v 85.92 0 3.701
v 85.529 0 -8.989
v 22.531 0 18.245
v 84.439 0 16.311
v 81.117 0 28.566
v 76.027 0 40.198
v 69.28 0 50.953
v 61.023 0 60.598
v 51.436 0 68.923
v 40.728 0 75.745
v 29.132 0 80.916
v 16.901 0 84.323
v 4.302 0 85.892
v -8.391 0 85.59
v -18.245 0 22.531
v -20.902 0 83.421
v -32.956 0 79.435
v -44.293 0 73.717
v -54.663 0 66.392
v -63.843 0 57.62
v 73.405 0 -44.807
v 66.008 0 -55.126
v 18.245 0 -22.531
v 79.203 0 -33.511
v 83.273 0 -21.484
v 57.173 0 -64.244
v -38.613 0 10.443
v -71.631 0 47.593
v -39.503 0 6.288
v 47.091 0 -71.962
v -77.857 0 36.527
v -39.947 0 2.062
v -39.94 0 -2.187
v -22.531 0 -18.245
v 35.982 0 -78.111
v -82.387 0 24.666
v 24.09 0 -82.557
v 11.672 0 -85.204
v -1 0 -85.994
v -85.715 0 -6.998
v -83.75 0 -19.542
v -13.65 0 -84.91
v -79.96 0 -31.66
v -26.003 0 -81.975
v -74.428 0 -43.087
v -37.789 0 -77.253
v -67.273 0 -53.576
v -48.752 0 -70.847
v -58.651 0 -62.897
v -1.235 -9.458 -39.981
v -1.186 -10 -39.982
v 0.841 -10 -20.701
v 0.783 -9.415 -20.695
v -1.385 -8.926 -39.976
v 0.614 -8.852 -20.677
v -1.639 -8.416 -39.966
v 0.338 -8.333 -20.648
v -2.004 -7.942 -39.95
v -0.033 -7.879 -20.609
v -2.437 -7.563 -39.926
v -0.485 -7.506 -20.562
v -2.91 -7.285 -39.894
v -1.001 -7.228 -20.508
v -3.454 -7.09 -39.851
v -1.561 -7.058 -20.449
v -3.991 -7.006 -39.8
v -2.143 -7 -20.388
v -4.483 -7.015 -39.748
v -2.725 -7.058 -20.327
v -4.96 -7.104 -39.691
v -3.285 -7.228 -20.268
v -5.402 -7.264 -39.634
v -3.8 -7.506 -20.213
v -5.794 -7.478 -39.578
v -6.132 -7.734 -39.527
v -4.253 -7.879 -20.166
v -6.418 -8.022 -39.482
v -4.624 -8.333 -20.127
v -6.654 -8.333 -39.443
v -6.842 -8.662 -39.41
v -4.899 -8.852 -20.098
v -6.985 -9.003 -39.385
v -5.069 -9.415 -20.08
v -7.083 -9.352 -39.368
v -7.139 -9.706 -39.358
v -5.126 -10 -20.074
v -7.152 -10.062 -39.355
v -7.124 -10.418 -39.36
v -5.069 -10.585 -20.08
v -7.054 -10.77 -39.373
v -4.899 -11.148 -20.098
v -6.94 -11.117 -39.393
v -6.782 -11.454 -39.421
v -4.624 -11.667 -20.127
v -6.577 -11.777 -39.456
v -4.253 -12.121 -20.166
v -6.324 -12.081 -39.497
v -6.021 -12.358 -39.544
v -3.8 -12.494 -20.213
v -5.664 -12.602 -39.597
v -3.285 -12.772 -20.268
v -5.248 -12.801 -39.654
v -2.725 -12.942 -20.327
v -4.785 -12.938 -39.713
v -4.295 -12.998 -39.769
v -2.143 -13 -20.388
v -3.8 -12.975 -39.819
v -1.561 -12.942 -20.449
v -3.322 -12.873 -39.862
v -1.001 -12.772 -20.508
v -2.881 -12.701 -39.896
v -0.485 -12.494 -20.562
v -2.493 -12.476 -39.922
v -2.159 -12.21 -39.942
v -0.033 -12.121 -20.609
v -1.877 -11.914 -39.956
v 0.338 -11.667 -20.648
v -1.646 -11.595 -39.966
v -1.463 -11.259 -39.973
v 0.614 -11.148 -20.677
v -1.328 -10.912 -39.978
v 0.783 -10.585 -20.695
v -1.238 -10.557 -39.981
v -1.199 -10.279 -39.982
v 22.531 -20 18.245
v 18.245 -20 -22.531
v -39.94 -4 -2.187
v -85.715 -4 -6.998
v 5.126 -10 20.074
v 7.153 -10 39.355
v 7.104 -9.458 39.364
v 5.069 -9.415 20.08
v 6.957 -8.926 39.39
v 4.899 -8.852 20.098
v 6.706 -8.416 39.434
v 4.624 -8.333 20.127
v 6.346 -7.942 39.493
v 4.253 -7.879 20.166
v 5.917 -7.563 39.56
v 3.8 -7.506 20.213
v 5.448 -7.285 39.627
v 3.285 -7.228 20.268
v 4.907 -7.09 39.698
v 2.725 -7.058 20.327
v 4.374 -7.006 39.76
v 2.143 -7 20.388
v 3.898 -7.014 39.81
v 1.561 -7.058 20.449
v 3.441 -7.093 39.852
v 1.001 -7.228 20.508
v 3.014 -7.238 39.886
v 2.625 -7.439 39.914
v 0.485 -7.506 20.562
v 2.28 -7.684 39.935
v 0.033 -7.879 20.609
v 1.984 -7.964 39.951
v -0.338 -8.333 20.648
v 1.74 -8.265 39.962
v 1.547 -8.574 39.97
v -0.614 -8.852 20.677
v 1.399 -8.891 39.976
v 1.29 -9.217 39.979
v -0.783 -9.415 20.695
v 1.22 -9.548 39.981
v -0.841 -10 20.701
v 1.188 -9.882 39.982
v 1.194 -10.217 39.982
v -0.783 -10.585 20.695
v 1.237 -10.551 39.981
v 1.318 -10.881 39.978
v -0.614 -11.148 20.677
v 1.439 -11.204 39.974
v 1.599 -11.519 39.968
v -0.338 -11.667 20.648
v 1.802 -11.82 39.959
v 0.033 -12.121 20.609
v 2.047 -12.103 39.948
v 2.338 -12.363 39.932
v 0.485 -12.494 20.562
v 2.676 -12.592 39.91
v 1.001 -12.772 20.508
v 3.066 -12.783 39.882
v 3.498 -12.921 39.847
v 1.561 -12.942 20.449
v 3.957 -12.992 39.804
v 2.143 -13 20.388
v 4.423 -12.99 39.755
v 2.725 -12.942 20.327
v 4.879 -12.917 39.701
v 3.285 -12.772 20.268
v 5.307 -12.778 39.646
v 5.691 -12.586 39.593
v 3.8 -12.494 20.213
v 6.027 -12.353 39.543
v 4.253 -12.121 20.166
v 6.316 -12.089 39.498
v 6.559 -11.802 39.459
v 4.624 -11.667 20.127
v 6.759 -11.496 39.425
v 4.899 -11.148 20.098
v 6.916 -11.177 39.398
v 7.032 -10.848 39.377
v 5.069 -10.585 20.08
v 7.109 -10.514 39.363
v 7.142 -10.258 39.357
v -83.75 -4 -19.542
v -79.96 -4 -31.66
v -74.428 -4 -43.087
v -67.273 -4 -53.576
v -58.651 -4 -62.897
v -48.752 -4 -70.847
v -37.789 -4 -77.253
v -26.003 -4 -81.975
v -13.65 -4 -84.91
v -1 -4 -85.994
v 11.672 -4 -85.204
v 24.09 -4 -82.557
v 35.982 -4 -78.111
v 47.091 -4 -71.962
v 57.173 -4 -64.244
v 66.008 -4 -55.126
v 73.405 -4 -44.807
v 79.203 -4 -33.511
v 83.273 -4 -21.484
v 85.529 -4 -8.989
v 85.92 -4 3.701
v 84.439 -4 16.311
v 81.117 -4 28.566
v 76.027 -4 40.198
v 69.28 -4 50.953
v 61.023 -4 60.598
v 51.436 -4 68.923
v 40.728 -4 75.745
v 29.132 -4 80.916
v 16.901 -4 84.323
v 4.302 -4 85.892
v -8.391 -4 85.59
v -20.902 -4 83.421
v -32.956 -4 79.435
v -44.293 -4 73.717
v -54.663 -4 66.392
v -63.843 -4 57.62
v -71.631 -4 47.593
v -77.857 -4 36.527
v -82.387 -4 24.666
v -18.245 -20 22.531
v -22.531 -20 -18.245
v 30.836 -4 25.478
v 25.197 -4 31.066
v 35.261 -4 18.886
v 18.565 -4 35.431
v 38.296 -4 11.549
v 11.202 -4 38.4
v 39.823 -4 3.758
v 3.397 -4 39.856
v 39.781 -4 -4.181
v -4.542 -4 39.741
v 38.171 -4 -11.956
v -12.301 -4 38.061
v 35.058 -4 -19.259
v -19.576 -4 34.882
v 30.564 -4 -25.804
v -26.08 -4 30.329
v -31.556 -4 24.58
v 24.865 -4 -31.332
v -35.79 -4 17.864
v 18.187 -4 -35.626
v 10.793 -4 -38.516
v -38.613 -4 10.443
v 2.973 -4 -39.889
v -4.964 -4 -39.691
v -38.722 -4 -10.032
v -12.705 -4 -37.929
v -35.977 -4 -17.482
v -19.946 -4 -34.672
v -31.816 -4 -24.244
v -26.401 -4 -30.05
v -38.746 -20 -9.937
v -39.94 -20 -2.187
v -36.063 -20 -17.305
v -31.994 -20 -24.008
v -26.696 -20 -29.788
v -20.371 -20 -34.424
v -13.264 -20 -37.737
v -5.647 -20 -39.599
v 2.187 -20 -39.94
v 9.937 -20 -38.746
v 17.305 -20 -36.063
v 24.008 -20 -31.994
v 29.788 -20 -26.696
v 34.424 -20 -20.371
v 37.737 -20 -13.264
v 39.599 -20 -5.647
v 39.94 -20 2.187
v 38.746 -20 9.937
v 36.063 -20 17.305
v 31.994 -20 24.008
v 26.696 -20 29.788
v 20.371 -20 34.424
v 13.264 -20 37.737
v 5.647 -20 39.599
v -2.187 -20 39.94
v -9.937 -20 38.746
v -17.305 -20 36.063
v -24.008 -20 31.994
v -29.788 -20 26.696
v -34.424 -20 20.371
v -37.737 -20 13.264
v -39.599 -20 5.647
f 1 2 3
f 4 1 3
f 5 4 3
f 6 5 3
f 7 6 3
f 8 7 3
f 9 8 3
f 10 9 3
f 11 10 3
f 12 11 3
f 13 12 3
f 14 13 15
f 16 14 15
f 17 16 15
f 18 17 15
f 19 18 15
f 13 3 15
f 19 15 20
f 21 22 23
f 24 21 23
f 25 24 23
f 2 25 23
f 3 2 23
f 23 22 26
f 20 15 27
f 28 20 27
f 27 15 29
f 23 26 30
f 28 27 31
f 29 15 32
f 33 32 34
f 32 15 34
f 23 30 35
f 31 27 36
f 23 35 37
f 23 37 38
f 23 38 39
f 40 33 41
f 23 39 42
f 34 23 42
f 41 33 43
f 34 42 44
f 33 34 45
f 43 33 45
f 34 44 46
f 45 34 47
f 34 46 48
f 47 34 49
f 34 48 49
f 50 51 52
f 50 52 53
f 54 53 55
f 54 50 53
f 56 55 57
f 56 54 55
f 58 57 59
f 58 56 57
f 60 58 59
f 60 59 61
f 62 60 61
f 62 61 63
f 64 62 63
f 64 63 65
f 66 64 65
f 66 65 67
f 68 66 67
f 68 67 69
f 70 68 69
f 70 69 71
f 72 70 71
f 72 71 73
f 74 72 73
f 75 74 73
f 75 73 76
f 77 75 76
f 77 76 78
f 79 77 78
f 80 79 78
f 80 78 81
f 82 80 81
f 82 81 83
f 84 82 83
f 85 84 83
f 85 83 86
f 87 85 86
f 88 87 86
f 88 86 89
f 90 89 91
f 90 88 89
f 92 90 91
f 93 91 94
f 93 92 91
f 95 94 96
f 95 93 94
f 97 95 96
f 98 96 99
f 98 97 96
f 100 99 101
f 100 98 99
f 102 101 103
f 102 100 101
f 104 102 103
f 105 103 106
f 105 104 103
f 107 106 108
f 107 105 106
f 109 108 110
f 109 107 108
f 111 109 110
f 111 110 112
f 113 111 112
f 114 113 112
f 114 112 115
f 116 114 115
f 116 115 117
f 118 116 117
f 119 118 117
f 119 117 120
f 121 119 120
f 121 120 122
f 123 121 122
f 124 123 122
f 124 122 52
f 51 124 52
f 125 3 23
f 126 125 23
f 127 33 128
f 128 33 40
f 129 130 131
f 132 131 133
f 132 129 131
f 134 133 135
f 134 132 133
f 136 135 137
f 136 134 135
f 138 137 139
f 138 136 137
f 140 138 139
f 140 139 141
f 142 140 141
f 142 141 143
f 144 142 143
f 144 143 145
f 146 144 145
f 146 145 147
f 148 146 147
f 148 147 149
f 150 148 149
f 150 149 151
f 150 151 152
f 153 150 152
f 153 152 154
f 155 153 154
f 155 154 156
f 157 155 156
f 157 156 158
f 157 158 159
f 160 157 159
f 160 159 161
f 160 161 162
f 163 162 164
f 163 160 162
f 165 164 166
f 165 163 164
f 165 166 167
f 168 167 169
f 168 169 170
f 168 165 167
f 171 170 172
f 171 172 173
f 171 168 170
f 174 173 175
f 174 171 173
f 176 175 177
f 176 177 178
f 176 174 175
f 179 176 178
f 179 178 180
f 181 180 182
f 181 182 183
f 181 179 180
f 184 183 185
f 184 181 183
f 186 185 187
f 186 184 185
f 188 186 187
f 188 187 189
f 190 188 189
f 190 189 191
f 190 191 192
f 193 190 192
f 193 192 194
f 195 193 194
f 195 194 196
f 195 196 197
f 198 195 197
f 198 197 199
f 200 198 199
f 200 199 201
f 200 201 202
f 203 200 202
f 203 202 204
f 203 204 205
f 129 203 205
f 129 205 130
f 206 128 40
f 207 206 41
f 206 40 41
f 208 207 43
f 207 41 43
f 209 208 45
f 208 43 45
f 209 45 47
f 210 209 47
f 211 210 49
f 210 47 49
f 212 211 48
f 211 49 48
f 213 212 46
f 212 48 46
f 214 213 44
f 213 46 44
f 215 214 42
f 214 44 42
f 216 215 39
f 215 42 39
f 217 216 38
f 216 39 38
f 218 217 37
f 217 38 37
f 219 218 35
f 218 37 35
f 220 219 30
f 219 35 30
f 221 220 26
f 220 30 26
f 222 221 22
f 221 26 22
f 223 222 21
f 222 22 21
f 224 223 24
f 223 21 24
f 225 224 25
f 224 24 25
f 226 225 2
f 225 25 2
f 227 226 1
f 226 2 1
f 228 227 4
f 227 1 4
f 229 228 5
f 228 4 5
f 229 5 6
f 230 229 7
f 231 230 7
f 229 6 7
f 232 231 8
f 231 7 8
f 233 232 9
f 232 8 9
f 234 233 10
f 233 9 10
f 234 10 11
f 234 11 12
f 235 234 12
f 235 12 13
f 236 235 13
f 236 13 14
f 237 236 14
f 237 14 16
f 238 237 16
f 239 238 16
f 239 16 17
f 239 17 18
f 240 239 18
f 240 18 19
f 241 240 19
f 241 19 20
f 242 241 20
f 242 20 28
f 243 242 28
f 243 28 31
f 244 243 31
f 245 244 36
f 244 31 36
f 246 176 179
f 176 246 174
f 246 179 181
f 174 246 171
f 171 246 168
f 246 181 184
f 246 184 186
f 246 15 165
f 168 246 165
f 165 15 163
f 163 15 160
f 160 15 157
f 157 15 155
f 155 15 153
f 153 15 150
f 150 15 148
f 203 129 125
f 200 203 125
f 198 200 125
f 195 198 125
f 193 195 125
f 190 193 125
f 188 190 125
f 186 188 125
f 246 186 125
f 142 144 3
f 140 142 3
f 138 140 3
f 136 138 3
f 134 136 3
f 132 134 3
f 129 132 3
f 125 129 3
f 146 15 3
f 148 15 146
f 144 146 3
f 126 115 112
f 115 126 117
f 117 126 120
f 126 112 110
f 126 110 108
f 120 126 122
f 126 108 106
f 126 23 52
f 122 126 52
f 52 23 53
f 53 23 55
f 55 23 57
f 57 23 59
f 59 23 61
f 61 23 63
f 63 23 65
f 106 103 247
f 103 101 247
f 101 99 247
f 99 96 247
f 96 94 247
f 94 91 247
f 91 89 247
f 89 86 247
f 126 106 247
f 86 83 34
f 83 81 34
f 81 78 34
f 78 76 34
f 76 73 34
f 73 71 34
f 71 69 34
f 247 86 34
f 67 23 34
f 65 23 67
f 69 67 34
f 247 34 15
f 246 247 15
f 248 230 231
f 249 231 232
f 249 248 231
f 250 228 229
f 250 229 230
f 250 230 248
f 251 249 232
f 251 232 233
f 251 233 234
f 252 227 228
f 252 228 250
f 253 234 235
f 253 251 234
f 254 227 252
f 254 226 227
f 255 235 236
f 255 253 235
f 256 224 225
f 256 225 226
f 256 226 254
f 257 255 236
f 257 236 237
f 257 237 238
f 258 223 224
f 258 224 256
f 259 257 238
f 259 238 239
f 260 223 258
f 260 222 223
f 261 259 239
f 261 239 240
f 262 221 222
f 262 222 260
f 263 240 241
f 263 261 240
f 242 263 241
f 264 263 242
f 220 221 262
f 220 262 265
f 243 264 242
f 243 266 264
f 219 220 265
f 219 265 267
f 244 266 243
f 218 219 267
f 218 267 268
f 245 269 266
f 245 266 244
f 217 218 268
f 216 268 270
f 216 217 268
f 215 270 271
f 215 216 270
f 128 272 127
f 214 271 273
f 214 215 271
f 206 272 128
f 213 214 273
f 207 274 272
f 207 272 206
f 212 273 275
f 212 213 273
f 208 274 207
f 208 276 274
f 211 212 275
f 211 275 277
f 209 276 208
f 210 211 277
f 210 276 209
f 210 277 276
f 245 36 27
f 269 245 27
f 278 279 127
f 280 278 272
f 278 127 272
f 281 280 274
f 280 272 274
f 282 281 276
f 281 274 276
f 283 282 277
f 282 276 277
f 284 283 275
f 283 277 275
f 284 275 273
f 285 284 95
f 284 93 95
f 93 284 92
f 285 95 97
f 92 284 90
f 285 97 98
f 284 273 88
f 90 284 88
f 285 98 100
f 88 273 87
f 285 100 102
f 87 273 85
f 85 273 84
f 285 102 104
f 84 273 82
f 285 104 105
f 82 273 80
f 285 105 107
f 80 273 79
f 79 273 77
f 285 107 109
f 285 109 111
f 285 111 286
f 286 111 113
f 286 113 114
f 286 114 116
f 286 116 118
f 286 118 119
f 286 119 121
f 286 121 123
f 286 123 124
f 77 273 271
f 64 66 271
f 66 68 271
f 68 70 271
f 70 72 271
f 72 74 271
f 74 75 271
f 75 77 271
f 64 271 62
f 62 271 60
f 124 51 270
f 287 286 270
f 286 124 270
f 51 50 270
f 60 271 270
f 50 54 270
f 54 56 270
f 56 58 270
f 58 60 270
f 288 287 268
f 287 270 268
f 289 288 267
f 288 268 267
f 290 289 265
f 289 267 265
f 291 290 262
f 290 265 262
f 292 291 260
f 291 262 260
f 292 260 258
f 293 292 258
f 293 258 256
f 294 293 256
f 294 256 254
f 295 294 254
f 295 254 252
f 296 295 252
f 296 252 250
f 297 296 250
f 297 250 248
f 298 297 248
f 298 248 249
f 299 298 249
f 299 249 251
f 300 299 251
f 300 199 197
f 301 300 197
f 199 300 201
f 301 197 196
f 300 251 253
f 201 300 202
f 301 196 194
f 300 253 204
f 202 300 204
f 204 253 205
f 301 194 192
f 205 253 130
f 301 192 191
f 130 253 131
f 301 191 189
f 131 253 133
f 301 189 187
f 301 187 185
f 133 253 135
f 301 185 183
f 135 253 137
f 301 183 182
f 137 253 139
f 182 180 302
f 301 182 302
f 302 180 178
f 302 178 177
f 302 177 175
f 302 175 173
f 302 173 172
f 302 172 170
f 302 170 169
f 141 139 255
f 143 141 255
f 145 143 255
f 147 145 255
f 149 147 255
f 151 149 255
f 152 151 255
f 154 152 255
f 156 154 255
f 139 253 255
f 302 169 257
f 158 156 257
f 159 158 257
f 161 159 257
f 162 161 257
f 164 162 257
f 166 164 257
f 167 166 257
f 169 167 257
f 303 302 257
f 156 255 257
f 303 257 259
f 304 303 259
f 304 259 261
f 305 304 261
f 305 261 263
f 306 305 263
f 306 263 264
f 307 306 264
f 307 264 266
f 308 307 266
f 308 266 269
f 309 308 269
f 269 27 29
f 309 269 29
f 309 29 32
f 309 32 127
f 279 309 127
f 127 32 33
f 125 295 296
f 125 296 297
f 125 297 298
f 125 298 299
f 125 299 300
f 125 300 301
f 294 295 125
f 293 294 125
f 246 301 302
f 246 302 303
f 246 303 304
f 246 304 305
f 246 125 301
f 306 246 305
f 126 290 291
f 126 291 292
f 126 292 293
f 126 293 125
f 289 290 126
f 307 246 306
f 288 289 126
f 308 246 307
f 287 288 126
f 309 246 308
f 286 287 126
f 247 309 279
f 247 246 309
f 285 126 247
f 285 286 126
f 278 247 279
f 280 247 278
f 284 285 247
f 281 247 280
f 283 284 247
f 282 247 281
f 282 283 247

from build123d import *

# Parameters (mm, degrees)
SKETCH7_W               = 86
SKETCH7_H               = 4
CUT_EXTRUDE3_DEPTH      = 122.688125961
CUT_EXTRUDE3_DEPTH_BACK = 122.688125961
SKETCH9_R               = 40
CUT_EXTRUDE4_DEPTH      = 122.688125961
SKETCH10_R              = 40
BOSS_EXTRUDE1_DEPTH     = 20
CUT_EXTRUDE7_DEPTH      = 124.255831505
CUT_EXTRUDE8_DEPTH      = 140.597641687
CUT_EXTRUDE8_DEPTH_BACK = 140.597641687
SKETCH15_R              = 3


with BuildPart() as part:
    # Sketch7 → Revolve4 (revolve)
    with BuildSketch(Plane.XY):
        with Locations((-43, -2)):
            Rectangle(SKETCH7_W, SKETCH7_H)
    revolve(axis=Axis((0, 0, 0), (0, -1, 0)))

    # Sketch9 → Cut-Extrude3 (cut, two sides: drawn at the far end of the back side and taken through both)
    with BuildSketch(Plane(origin=(0, 0, 0), x_dir=(1, 0, 0), z_dir=(0, 1, 0)).offset(-CUT_EXTRUDE3_DEPTH_BACK)):
        Circle(SKETCH9_R)
    extrude(amount=CUT_EXTRUDE3_DEPTH + CUT_EXTRUDE3_DEPTH_BACK, mode=Mode.SUBTRACT)

    # Sketch1 → Cut-Extrude4 (cut, through all)
    with BuildSketch(Plane(origin=(0, 0, 0), x_dir=(1, 0, 0), z_dir=(0, 1, 0))):
        with BuildLine():
            Line((-86.191983256, -25.902548569), (-9.566772234, -1.00550828))
            Line((-9.566772234, -1.00550828), (-89.693924294, 7.416194762))
            ThreePointArc((-89.693924294, 7.416194762), (-89.506970583, -9.407561694), (-86.191983256, -25.902548569))
        make_face()
    extrude(amount=-CUT_EXTRUDE4_DEPTH, mode=Mode.SUBTRACT)

    # Sketch10 → Boss-Extrude1 (add)
    with BuildSketch(Plane(origin=(0, 0, 0), x_dir=(-1, 0, 0), z_dir=(0, -1, 0))):
        Circle(SKETCH10_R)
    extrude(amount=BOSS_EXTRUDE1_DEPTH)

    # Sketch14 → Cut-Extrude7 (cut, through all)
    with BuildSketch(Plane(origin=(0, 0, 0), x_dir=(1, 0, 0), z_dir=(0, 1, 0))):
        Polygon((22.530532352, -18.244865358), (18.244865358, 22.530532352), (-22.530532352, 18.244865358), (-18.244865358, -22.530532352), align=None)
    extrude(amount=-CUT_EXTRUDE7_DEPTH, mode=Mode.SUBTRACT)

    # Sketch15 → Cut-Extrude8 (cut, two sides: drawn at the far end of the back side and taken through both)
    with BuildSketch(Plane(origin=(-2.142833497, 0, -20.387698855), x_dir=(0.9945218953682733, 0, -0.10452846326765386), z_dir=(0.10452846326765386, 0, 0.9945218953682733)).offset(-CUT_EXTRUDE8_DEPTH_BACK)):
        with Locations((0, -10)):
            Circle(SKETCH15_R)
    extrude(amount=CUT_EXTRUDE8_DEPTH + CUT_EXTRUDE8_DEPTH_BACK, mode=Mode.SUBTRACT)


solid = part.part
